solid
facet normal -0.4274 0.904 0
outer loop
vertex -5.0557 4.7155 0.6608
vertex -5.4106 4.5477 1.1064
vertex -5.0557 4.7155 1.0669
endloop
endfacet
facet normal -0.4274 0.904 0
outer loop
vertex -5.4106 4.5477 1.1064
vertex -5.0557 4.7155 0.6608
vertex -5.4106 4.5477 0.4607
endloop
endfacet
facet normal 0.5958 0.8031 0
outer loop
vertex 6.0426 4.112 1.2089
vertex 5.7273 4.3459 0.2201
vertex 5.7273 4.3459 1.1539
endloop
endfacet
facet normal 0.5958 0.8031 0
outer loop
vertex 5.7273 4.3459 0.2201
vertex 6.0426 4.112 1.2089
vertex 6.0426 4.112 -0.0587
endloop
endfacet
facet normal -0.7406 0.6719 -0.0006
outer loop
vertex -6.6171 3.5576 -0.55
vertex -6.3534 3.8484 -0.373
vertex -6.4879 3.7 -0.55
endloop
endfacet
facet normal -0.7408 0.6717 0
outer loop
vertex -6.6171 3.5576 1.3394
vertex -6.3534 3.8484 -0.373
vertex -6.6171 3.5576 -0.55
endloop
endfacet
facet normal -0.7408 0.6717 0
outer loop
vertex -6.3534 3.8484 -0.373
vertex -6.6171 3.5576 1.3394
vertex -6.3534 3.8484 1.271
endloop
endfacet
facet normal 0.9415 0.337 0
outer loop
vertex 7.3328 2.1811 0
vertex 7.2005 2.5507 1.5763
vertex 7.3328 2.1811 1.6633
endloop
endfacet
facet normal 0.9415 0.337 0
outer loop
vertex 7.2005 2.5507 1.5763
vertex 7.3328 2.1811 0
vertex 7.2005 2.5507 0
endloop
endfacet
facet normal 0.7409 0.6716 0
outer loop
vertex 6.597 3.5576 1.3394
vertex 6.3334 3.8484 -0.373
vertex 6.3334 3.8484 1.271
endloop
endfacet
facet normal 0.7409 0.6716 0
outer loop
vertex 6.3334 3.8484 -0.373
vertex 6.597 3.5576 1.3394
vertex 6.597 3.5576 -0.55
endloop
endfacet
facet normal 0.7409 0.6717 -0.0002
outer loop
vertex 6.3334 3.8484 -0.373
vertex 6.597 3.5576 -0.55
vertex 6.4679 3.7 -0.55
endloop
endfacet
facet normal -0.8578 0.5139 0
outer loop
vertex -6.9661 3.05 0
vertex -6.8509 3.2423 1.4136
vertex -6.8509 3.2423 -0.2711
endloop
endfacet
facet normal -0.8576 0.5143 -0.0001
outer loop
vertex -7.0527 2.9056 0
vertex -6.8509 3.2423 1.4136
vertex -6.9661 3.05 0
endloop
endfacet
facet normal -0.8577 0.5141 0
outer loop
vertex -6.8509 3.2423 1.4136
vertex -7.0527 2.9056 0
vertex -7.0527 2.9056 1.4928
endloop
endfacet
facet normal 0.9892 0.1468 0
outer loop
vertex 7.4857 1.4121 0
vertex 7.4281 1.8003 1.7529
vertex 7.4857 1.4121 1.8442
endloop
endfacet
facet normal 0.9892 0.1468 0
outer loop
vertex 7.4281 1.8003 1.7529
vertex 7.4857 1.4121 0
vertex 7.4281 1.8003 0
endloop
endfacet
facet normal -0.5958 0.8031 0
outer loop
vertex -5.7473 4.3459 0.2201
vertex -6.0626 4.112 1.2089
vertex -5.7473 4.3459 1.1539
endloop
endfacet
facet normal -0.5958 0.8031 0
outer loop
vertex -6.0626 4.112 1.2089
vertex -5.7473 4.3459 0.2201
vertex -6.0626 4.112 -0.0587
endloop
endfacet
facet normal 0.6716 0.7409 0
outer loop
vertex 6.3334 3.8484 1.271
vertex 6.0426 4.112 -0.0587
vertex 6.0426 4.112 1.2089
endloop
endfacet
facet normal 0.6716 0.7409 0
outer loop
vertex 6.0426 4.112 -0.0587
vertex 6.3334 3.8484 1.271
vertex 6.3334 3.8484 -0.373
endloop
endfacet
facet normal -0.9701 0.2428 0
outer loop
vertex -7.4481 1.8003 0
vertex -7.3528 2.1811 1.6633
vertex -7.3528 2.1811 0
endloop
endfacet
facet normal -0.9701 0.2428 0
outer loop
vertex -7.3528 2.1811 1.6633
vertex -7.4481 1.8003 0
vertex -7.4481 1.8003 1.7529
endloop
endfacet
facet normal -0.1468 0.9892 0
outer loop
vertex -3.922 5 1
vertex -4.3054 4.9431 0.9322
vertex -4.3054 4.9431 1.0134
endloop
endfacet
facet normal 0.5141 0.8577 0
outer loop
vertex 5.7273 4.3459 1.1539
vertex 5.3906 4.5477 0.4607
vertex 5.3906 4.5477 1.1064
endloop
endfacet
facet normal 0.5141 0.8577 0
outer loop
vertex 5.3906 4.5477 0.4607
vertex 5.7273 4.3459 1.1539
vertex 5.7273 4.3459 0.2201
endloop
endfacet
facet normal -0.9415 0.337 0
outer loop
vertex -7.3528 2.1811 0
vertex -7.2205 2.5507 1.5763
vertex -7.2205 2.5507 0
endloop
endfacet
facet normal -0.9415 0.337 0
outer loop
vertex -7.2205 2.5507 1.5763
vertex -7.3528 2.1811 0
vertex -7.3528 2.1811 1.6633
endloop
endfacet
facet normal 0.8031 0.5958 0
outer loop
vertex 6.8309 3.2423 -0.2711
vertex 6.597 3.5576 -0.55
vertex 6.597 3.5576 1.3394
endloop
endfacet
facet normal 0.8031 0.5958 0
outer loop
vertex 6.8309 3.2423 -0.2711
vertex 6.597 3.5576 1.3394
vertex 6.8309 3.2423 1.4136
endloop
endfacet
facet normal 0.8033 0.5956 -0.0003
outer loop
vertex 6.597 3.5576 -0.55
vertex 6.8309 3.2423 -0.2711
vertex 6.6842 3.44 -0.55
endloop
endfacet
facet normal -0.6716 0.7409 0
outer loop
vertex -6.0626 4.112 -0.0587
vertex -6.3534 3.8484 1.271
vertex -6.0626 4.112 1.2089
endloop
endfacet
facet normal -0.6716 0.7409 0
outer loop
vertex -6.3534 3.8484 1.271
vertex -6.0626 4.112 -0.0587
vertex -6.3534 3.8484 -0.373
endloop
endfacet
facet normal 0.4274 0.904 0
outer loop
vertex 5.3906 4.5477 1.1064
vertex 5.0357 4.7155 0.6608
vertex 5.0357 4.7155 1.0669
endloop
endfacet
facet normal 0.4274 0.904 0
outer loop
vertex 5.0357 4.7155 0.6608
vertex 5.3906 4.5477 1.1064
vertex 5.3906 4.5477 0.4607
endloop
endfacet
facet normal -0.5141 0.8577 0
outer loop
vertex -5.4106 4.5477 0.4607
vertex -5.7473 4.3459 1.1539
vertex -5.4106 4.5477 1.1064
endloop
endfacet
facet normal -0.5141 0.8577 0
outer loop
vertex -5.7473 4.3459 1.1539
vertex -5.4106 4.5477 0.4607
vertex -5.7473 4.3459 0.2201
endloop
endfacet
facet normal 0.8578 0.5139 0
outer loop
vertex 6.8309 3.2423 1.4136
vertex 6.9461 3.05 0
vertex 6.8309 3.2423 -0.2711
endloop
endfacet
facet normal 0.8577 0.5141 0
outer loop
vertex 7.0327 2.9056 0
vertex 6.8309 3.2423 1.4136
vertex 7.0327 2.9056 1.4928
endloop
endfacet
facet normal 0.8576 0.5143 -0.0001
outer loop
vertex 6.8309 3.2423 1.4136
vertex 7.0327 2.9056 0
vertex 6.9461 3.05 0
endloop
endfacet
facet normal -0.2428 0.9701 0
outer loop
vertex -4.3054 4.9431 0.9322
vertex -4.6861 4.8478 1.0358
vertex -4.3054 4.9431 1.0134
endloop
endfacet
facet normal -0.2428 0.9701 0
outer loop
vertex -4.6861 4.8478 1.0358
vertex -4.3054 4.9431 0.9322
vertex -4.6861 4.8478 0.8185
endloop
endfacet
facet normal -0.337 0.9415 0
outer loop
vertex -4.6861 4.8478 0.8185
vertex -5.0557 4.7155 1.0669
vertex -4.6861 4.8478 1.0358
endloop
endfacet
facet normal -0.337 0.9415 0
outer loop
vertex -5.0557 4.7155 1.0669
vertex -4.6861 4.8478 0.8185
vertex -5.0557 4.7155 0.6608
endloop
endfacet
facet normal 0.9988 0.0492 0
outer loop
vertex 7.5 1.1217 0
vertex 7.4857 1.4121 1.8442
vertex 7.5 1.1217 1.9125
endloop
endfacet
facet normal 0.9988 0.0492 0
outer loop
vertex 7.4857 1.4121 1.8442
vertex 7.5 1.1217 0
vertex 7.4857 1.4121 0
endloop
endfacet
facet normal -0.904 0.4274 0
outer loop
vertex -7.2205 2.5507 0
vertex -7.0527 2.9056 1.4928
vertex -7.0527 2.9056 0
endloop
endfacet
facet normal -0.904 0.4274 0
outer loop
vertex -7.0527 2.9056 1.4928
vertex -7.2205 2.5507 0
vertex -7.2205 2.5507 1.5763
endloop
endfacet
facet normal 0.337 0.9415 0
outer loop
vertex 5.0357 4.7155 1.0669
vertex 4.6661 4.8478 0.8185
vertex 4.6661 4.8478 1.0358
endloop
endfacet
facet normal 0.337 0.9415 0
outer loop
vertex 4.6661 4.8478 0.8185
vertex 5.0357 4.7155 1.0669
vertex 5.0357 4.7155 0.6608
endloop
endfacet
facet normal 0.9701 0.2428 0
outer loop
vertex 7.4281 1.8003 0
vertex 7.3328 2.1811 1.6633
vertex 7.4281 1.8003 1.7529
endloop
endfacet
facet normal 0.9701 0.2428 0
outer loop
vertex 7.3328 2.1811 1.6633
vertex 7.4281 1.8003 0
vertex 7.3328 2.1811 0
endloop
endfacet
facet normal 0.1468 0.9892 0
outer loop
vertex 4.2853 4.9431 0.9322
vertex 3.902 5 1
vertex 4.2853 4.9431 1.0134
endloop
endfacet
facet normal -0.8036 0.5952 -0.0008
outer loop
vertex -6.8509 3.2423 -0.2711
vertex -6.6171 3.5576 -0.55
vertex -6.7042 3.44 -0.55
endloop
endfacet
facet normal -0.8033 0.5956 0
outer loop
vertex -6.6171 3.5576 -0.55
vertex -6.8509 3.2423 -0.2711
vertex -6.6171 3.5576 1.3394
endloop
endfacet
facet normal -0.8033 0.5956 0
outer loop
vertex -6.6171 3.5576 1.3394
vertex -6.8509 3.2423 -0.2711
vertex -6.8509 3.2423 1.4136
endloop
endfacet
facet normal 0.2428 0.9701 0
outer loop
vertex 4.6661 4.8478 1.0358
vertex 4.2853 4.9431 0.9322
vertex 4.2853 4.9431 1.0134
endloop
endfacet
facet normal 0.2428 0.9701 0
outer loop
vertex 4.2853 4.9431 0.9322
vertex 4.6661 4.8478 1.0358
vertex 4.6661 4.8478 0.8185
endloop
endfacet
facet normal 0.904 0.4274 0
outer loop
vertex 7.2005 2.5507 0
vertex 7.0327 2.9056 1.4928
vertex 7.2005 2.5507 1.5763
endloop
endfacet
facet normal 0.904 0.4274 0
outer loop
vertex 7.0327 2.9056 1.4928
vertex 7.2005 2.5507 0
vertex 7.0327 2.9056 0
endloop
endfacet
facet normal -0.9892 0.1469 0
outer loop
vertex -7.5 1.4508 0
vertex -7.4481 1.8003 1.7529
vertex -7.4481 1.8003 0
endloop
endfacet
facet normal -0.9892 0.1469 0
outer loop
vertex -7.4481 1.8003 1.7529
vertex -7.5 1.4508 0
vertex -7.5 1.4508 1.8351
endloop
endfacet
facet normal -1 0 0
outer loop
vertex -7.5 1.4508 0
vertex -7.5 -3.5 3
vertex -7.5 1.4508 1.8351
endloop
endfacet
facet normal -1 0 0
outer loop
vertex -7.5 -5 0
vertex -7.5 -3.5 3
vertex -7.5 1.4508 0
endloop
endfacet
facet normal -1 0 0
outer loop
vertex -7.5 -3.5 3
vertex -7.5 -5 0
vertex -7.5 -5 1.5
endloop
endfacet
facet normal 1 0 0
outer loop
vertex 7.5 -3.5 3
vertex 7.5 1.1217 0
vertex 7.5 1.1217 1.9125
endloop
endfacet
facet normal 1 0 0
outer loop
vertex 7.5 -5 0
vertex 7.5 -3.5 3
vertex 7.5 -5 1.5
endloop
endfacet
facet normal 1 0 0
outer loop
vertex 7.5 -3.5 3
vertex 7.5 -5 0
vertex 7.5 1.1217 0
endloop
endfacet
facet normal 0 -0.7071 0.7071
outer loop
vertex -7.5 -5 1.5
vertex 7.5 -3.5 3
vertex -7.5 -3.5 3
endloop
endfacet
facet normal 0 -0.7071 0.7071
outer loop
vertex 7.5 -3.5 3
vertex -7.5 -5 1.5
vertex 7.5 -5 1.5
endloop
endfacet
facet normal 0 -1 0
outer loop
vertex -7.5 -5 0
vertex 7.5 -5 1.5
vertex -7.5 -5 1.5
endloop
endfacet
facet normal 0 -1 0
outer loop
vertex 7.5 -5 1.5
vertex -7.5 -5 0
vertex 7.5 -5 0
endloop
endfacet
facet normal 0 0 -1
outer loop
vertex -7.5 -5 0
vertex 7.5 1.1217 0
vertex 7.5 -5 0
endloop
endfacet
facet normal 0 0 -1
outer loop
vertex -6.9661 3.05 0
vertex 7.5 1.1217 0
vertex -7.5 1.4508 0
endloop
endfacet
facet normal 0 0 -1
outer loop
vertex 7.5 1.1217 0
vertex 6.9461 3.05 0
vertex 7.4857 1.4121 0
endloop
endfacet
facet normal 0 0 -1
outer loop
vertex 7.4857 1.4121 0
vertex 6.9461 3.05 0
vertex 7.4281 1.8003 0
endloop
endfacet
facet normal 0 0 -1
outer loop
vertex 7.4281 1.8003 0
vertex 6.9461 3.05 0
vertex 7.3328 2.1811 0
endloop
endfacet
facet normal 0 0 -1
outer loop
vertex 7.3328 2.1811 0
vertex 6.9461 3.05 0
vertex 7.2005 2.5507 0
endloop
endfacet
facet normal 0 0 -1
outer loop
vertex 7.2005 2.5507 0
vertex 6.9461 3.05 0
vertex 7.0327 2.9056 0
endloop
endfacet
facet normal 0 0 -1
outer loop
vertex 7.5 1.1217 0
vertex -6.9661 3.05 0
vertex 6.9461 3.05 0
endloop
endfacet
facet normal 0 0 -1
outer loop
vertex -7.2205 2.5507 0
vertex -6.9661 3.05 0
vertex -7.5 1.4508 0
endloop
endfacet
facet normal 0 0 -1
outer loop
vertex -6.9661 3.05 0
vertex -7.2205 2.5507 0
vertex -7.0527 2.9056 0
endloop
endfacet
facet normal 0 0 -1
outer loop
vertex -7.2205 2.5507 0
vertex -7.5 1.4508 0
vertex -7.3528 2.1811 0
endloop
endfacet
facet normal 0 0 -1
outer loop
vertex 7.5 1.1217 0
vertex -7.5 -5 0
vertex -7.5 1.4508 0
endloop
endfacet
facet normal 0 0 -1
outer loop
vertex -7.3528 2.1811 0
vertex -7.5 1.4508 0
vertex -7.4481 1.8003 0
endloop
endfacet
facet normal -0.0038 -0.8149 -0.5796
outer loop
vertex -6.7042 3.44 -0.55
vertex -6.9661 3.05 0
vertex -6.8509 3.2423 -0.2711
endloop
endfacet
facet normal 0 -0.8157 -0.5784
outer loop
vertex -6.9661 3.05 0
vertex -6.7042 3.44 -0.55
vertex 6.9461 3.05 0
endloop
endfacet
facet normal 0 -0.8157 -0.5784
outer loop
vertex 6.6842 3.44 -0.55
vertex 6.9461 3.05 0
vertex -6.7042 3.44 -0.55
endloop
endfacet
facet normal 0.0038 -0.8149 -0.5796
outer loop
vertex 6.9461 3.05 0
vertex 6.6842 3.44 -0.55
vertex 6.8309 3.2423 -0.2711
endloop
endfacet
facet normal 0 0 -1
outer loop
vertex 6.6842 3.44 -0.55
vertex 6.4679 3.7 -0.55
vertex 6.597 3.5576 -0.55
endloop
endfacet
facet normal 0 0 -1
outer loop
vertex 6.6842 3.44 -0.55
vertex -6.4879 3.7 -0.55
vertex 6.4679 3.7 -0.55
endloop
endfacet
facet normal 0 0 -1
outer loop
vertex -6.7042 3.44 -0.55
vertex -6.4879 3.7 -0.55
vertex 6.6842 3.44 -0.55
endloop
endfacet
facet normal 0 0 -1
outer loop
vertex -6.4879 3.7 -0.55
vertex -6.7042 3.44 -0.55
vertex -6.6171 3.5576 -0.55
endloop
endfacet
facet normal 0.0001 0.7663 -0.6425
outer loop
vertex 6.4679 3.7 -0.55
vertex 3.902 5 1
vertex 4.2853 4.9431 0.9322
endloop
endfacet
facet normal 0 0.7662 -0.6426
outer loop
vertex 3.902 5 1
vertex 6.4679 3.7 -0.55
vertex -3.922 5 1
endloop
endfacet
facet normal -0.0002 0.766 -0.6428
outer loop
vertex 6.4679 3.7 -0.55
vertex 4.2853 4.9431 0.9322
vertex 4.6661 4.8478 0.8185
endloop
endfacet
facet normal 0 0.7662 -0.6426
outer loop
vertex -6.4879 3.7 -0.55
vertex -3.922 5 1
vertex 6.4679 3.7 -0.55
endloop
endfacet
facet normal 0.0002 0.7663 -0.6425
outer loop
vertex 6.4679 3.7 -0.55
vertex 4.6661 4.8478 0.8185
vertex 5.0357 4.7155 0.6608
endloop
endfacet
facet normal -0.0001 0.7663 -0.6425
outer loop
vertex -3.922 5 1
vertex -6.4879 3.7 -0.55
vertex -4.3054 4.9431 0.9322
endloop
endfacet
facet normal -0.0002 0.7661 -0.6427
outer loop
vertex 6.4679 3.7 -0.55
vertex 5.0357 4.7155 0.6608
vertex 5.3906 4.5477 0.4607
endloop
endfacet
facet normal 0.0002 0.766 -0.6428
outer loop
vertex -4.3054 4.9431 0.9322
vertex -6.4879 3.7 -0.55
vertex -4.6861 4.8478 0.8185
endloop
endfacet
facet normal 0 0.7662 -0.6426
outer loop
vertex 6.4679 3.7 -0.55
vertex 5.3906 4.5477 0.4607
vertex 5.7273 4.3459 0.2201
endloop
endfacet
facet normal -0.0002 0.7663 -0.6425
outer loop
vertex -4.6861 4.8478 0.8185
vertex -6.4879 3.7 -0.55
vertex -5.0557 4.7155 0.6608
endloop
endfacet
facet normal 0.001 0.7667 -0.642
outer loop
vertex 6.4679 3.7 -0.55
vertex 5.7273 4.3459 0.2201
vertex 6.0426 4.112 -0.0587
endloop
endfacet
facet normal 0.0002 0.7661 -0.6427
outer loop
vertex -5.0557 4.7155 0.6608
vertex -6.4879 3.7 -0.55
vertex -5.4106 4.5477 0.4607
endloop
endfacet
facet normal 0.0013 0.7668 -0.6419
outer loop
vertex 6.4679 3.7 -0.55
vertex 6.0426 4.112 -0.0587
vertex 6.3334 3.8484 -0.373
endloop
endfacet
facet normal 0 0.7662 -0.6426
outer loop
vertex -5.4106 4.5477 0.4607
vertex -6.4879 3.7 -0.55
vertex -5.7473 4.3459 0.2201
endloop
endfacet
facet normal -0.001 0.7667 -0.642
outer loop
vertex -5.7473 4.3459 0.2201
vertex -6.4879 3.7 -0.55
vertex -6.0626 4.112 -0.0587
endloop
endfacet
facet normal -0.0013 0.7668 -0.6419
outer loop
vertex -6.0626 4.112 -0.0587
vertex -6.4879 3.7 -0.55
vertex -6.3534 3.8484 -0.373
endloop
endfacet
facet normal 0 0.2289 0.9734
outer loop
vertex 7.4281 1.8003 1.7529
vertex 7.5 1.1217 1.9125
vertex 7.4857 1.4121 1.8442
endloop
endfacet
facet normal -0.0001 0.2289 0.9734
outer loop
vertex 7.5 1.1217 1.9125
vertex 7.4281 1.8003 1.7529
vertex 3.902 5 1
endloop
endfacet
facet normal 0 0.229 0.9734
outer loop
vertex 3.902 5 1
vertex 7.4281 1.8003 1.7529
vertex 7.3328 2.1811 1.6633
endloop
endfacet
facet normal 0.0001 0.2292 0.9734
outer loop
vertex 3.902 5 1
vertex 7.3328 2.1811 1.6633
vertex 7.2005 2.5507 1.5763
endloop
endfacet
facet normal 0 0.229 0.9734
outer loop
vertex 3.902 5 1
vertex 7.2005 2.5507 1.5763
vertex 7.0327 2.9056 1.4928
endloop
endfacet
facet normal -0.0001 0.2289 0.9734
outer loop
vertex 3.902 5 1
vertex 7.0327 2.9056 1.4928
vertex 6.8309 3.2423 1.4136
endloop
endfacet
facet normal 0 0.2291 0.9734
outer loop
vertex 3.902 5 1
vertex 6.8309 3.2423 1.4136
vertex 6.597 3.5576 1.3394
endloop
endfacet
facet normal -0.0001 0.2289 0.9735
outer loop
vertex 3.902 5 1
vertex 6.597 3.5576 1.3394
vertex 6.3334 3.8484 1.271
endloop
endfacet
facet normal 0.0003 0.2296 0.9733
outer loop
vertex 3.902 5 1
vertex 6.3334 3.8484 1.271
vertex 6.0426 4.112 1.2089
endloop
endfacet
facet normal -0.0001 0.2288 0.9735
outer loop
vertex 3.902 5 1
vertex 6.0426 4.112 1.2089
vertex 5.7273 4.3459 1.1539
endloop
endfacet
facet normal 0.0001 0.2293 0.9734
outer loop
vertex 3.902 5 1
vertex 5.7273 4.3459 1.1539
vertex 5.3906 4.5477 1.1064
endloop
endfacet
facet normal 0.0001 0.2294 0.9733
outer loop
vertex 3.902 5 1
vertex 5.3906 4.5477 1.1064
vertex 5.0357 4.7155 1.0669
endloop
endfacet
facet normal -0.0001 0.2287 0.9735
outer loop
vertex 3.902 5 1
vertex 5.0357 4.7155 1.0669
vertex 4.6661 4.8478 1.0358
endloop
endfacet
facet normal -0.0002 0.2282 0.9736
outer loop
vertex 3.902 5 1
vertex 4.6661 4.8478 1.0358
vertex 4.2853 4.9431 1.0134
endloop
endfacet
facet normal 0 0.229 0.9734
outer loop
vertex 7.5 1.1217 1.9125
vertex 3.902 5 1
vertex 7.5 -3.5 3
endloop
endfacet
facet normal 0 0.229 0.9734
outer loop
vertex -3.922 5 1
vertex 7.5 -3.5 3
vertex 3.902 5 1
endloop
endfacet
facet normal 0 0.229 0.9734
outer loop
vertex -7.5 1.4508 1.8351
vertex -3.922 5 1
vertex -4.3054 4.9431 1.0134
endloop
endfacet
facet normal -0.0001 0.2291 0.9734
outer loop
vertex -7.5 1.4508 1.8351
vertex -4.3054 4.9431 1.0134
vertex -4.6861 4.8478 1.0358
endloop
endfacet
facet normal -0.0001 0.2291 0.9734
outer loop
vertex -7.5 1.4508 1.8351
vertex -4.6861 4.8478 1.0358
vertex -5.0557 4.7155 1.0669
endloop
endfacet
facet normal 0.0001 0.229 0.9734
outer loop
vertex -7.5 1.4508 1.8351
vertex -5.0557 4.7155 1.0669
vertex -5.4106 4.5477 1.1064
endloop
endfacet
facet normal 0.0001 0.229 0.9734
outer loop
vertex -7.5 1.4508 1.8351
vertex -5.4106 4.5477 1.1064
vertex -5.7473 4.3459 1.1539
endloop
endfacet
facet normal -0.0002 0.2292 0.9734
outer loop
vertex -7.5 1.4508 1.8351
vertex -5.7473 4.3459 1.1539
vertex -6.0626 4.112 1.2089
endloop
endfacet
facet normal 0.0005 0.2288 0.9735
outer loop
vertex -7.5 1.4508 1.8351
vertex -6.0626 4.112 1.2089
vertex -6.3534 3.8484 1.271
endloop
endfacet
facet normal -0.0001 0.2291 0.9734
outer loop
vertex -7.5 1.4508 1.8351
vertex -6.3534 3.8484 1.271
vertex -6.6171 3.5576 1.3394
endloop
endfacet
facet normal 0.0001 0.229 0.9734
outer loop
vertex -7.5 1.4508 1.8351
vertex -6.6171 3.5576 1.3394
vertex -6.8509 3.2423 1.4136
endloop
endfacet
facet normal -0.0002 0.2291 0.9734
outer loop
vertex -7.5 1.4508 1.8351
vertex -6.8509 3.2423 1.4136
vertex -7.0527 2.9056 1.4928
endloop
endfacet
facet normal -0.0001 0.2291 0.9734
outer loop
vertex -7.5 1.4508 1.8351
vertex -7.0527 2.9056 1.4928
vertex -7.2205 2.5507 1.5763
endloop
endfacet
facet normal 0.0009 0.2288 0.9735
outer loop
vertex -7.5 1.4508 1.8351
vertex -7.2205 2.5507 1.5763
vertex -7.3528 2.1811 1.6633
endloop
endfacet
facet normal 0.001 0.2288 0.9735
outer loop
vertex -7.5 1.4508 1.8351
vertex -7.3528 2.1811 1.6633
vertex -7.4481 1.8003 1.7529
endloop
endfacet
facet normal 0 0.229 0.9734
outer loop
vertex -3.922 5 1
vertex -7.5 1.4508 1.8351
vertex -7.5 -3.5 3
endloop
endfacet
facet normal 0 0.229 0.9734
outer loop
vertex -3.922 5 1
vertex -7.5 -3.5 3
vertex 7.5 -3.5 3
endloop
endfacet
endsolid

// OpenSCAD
// Start: lazy_union
default_5_default_5();
// End: lazy_union

// Modules.

// 'PartMaterial undef-default - default 5.0'
module default_5_default_5() {
  // 'None : _combine_solids_and_holes'
  union() {
    // '_combine_solids_and_holes'
    difference() {
      // 'default : _combine_solids_and_holes'
      union() {
        // 'tooth'
        multmatrix(m=[[0.0, 0.0, 1.0, -7.5], [0.0, -1.0, 0.0, 5.0], [1.0, 0.0, 0.0, 0.0], [0.0, 0.0, 0.0, 1.0]]) {
          // 'tooth : _combine_solids_and_holes'
          union() {
            // 'tooth'
            linear_extrude(height=15.0, twist=0.0, slices=4, scale=[1.0, 1.0]) {
              polygon(points=[[1.0, 0.0], [-0.55, 1.3], [-0.55, 1.56], [0.0, 1.9500000000000002], [0.0, 10.0], [1.5, 10.0], [3.0, 8.5]]);
            }
          }
        }
      }
      // 'default'
      multmatrix(m=[[1.0, 0.0, 0.0, -0.005], [0.0, 1.0, 0.0, 0.01], [0.0, 0.0, 1.0, 0.7599999999999998], [0.0, 0.0, 0.0, 1.0]]) {
        // '_combine_solids_and_holes'
        difference() {
          // 'clip : _combine_solids_and_holes'
          union() {
            // 'clip'
            multmatrix(m=[[1.0, 0.0, 0.0, -7.515000000000001], [0.0, 1.0, 0.0, 1.0099999999999998], [0.0, 0.0, 1.0, -2.26], [0.0, 0.0, 0.0, 1.0]]) {
              // 'clip : _combine_solids_and_holes'
              union() {
                // 'clip'
                cube(size=[15.025, 4.0, 4.5249999999999995]);
              }
            }
          }
          // 'clip'
          multmatrix(m=[[1.0, 0.0, 0.0, -0.004999999999999893], [0.0, 1.0, 0.0, -0.004999999999999893], [0.0, 0.0, 1.0, 0.004999999999999893], [0.0, 0.0, 0.0, 1.0]]) {
            // 'keep : _combine_solids_and_holes'
            union() {
              // 'hull'
              multmatrix(m=[[1.0, 0.0, 0.0, -7.515], [0.0, 1.0, 0.0, -5.015], [0.0, 0.0, 1.0, -2.2649999999999997], [0.0, 0.0, 0.0, 1.0]]) {
                // 'hull : _combine_solids_and_holes'
                union() {
                  // 'hull'
                  linear_extrude(height=4.529999999999999, twist=0.0, slices=4, scale=[1.0, 1.0]) {
                    polygon(points=[[4.0, 0.0], [11.03, 0.0], [11.422068561318243, 0.01926109331121273], [11.810361288064513, 0.07685887838707828], [12.19113870901785, 0.17223865707116426], [12.560733729460358, 0.30448186995485305], [12.915586947303991, 0.47231494260658025], [13.252280932078408, 0.6741215507898191], [13.56757313665458, 0.9079581865490525], [13.85842712474619, 1.1715728752538097], [14.122041813450947, 1.462426863345418], [14.35587844921018, 1.7777190679215913], [14.55768505739342, 2.1144130526960088], [14.725518130045145, 2.4692662705396407], [14.857761342928836, 2.838861290982151], [14.953141121612921, 3.219638711935487], [15.010738906688786, 3.607931438681757], [15.03, 3.9999999999999996], [15.03, 6.029999999999999], [15.010738906688786, 6.422068561318242], [14.953141121612921, 6.810361288064513], [14.857761342928836, 7.191138709017849], [14.725518130045147, 7.560733729460359], [14.557685057393421, 7.91558694730399], [14.35587844921018, 8.252280932078408], [14.122041813450947, 8.567573136654582], [13.85842712474619, 8.85842712474619], [13.567573136654582, 9.122041813450949], [13.25228093207841, 9.35587844921018], [12.915586947303991, 9.557685057393421], [12.56073372946036, 9.725518130045147], [12.19113870901785, 9.857761342928836], [11.810361288064513, 9.953141121612923], [11.422068561318243, 10.010738906688788], [11.03, 10.030000000000001], [4.0, 10.03], [3.6079314386817583, 10.010738906688786], [3.219638711935487, 9.953141121612921], [2.838861290982151, 9.857761342928836], [2.4692662705396407, 9.725518130045145], [2.1144130526960083, 9.55768505739342], [1.7777190679215913, 9.35587844921018], [1.4624268633454172, 9.122041813450947], [1.1715728752538088, 8.85842712474619], [0.907958186549052, 8.567573136654582], [0.6741215507898186, 8.252280932078408], [0.47231494260657847, 7.915586947303989], [0.30448186995485216, 7.56073372946036], [0.17223865707116337, 7.191138709017849], [0.0768588783870765, 6.810361288064512], [0.019261093311210953, 6.422068561318243], [-1.7763568394002505e-15, 6.03], [0.0, 4.0], [0.019261093311212285, 3.607931438681758], [0.07685887838707828, 3.2196387119354863], [0.17223865707116426, 2.838861290982152], [0.3044818699548526, 2.4692662705396415], [0.4723149426065798, 2.114413052696009], [0.6741215507898182, 1.7777190679215922], [0.9079581865490516, 1.462426863345419], [1.1715728752538093, 1.1715728752538102], [1.4624268633454163, 0.9079581865490534], [1.7777190679215913, 0.6741215507898191], [2.1144130526960083, 0.47231494260658025], [2.469266270539639, 0.30448186995485393], [2.83886129098215, 0.1722386570711647], [3.2196387119354855, 0.07685887838707872], [3.6079314386817583, 0.019261093311212285]]);
                  }
                }
              }
            }
          }
        }
      }
    }
  }
} // end module default_5_default_5
